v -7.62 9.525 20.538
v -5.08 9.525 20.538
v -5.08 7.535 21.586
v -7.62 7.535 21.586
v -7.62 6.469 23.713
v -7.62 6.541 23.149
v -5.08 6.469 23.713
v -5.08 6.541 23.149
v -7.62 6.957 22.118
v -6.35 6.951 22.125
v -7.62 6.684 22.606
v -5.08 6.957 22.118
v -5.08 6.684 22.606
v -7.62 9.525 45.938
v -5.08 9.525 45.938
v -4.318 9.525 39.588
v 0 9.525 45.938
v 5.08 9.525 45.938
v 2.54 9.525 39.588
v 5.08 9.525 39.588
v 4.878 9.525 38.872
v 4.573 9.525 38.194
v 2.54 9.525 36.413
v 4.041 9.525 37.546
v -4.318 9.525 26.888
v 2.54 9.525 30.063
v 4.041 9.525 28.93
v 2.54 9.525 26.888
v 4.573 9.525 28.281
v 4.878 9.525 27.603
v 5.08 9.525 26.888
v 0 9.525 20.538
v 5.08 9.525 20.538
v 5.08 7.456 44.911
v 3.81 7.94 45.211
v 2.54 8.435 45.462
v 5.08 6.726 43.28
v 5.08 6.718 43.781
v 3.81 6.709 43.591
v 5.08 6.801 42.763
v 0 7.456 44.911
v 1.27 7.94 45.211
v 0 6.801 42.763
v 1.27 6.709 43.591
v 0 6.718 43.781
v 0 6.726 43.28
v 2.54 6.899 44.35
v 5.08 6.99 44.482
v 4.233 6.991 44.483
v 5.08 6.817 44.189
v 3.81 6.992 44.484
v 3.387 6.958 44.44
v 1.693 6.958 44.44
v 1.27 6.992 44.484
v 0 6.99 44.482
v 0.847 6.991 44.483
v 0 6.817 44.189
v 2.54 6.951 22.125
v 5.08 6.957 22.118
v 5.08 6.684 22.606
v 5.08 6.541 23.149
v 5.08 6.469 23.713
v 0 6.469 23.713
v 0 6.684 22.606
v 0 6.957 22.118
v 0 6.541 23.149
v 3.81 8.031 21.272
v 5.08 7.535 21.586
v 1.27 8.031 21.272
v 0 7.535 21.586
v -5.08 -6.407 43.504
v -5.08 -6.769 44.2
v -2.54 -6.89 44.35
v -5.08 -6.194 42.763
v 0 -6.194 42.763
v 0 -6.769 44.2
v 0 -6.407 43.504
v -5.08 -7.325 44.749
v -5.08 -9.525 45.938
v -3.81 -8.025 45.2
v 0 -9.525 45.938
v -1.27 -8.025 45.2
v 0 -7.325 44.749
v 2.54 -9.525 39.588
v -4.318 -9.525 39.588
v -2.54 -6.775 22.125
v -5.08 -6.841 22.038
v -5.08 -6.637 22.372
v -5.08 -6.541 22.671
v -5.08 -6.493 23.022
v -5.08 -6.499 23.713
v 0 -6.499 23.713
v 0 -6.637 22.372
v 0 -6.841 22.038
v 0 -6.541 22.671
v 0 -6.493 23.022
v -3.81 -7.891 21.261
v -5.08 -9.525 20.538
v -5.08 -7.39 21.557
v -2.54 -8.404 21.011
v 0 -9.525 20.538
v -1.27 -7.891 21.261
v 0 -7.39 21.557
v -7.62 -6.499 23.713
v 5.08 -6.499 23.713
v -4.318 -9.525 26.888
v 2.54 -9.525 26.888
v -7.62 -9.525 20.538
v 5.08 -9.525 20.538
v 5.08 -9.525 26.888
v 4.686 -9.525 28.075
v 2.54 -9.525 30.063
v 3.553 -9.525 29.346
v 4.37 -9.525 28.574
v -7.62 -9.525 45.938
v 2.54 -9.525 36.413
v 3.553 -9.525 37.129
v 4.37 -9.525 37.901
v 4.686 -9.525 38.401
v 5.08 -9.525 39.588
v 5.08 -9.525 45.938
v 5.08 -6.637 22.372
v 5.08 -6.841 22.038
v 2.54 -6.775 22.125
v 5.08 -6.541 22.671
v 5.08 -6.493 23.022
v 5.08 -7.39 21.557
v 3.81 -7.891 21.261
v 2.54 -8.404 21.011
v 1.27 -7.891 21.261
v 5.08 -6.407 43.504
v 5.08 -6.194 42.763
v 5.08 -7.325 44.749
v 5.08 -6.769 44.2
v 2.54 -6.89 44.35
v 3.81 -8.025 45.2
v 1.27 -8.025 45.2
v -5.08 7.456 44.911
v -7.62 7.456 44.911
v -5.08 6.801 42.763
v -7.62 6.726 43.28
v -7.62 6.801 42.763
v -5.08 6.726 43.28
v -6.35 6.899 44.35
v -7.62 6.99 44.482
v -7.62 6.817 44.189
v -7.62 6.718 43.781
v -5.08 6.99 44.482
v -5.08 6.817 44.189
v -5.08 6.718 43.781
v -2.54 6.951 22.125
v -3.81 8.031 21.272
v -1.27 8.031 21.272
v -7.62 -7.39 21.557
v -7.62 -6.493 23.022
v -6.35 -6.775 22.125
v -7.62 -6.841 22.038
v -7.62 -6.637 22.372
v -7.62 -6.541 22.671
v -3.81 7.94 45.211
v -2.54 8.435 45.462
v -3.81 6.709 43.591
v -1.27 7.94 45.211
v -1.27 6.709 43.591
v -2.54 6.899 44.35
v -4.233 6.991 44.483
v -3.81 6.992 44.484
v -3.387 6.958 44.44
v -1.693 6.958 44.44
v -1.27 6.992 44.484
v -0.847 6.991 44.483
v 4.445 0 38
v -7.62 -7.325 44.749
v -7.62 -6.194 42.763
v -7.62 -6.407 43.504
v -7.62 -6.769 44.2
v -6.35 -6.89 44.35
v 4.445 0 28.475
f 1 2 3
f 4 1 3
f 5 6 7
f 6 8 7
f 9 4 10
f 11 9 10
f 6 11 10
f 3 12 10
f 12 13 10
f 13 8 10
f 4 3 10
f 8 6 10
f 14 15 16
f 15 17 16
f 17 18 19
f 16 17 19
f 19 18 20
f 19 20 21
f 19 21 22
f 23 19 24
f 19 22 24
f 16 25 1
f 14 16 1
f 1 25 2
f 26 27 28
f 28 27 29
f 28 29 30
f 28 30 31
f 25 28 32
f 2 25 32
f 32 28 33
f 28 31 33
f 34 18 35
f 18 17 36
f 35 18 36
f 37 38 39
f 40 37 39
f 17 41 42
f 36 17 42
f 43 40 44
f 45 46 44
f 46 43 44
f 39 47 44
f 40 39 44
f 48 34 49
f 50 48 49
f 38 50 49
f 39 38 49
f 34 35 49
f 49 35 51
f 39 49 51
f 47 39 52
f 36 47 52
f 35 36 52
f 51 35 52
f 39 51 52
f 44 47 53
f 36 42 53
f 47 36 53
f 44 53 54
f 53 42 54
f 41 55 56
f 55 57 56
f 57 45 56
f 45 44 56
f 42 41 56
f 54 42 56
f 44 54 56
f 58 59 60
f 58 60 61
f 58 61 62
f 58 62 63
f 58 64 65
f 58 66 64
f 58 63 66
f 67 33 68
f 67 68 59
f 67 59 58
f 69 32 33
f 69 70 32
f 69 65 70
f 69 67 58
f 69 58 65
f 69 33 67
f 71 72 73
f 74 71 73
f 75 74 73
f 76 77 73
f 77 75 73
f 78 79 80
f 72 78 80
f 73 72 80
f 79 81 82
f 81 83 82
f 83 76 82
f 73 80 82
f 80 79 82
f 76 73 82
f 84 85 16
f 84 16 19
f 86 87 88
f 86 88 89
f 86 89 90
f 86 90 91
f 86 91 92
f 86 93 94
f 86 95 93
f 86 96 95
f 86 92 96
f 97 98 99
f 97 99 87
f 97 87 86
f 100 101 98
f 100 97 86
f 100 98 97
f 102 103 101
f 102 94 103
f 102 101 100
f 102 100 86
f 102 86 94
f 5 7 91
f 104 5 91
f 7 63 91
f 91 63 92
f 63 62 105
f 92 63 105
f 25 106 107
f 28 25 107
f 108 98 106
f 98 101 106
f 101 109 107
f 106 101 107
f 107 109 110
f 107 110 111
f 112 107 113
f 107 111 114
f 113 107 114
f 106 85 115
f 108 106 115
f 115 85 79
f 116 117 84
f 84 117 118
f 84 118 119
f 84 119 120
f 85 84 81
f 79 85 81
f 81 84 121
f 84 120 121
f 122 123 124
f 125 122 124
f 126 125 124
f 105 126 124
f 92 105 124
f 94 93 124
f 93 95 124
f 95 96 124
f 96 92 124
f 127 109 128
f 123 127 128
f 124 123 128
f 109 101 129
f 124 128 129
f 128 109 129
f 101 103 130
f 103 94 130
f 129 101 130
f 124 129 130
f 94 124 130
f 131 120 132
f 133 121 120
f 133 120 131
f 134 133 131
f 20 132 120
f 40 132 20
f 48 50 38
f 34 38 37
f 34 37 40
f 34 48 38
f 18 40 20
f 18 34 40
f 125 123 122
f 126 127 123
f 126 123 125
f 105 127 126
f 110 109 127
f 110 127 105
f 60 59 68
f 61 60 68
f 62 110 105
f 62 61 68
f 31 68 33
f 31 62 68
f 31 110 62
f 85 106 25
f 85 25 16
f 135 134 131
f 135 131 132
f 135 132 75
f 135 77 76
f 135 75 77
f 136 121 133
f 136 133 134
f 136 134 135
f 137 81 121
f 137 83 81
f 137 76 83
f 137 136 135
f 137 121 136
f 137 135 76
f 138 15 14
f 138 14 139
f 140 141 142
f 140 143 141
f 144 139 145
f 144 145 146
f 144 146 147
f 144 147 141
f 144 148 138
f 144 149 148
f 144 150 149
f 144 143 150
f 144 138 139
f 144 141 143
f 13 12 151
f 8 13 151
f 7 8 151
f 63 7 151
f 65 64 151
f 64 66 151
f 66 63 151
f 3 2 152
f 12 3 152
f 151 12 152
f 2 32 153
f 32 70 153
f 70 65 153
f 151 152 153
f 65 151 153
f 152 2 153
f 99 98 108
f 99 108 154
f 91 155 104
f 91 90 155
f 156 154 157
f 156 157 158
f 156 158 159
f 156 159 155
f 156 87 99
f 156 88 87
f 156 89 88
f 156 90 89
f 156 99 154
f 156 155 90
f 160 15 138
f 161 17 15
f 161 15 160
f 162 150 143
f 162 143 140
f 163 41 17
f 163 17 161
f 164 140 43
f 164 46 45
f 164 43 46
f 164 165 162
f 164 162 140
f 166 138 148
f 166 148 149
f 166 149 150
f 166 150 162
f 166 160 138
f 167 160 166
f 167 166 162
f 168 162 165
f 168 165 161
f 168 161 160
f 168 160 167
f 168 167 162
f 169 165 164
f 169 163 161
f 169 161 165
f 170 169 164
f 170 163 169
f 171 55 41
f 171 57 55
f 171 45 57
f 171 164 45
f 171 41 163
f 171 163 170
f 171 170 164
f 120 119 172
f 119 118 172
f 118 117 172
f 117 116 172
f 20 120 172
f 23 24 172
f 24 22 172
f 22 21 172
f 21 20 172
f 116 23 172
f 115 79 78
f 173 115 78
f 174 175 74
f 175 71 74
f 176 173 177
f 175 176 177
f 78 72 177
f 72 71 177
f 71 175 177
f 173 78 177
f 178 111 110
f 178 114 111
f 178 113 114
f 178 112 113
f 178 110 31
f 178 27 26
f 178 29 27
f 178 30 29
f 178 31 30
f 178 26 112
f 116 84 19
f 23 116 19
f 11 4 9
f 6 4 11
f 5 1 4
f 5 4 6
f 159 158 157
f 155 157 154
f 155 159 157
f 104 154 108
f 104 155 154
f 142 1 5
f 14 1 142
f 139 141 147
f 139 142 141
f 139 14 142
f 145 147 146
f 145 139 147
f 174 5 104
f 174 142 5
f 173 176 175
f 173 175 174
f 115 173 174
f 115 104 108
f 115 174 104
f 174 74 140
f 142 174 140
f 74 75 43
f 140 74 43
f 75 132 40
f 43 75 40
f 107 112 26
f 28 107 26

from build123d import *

# Parameters (mm, degrees)
F1_DEPTH  = 5.08
F2_W      = 9.398
F2_H      = 12.7
F3_DEPTH  = 36.4129
F5_W      = 19.05
F5_H      = 3.175
F4_W      = 19.05
F4_H      = 3.175
F6_DEPTH  = 2.54
F8_DEPTH  = 25.4
F10_DEPTH = 2.54


with BuildPart() as f1:
    # F0 (on Right) → F1 (new body, symmetric)
    with BuildSketch(Plane.YZ):
        Polygon((-9.525, 42.7627552986), (-9.525, 23.7127552986), (-6.4988480881, 23.7127552986), (6.468560081, 23.7127552986), (9.525, 23.7127552986), (9.525, 42.7627552986), (6.8012457341, 42.7627552986), (-6.1935493723, 42.7627552986), align=None)
        with BuildLine():
            Line((-9.525, 45.9377552986), (-9.525, 42.7627552986))
            Line((-9.525, 42.7627552986), (-6.1935493723, 42.7627552986))
            add(Edge.make_bspline(
                [(-9.525, 45.9377552986), (-8.4843289073, 45.4587623907), (-6.6623733691, 44.6201652706), (-6.3342528413, 43.3202012234), (-6.1935493723, 42.7627552986)],
                knots=[0, 0, 0, 0, 0.5711835832, 1, 1, 1, 1], degree=3))
        make_face()
        with BuildLine():
            add(Edge.make_bspline(
                [(9.525, 45.9377552986), (8.4082384885, 45.4684357534), (6.487493932, 44.6612419592), (6.708667258, 43.3229401352), (6.8012457341, 42.7627552986)],
                knots=[0, 0, 0, 0, 0.5814211514, 1, 1, 1, 1], degree=3))
            Line((6.8012457341, 42.7627552986), (9.525, 42.7627552986))
            Line((9.525, 42.7627552986), (9.525, 45.9377552986))
        make_face()
        with BuildLine():
            Line((-6.4988480881, 23.7127552986), (-9.525, 23.7127552986))
            Line((-9.525, 23.7127552986), (-9.525, 20.5377552986))
            add(Edge.make_bspline(
                [(-9.525, 20.5377552986), (-8.3782583984, 21.004520321), (-6.4146620617, 21.8037745617), (-6.4741154988, 23.1519254498), (-6.4988480881, 23.7127552986)],
                knots=[0, 0, 0, 0, 0.5840006829, 1, 1, 1, 1], degree=3))
        make_face()
        with BuildLine():
            Line((9.525, 23.7127552986), (6.468560081, 23.7127552986))
            add(Edge.make_bspline(
                [(9.525, 20.5377552986), (8.483129389, 21.0137326336), (6.6694729366, 21.8422994016), (6.528535002, 23.1544015571), (6.468560081, 23.7127552986)],
                knots=[0, 0, 0, 0, 0.5744586355, 1, 1, 1, 1], degree=3))
            Line((9.525, 20.5377552986), (9.525, 23.7127552986))
        make_face()
    extrude(amount=F1_DEPTH, both=True)

    # F2 (on face) → F3 (cut)
    with BuildSketch(Plane.XZ.offset(9.525)):
        with Locations((0.381, 33.2377552986)):
            Rectangle(F2_W, F2_H)
    extrude(amount=-F3_DEPTH, mode=Mode.SUBTRACT)

    # F5 (on face) + F4 (on face) → F6 (join)
    with BuildSketch(Plane.YZ.offset(5.08)):
        with Locations((0, 28.4752552986)):
            Rectangle(F5_W, F5_H)
    with BuildSketch(Plane.YZ.offset(5.08)):
        with Locations((0, 38.0002552986)):
            Rectangle(F4_W, F4_H)
    extrude(amount=-F6_DEPTH)

    # F7 (on face) → F8 (cut)
    with BuildSketch(Plane.XZ.offset(9.525)):
        with BuildLine():
            Line((5.08, 36.4127552986), (5.08, 39.5877552986))
            add(Edge.make_bspline(
                [(5.08, 39.5877552986), (4.9399237186, 39.0382267482), (4.6311542423, 37.8269035964), (3.2788294654, 36.9123905765), (2.54, 36.4127552986)],
                knots=[0, 0, 0, 0, 0.4536597435, 1, 1, 1, 1], degree=3))
            Line((2.54, 36.4127552986), (5.08, 36.4127552986))
        make_face()
        with BuildLine():
            add(Edge.make_bspline(
                [(5.08, 26.8877552986), (4.9399237186, 27.437283849), (4.6311542423, 28.6486070008), (3.2788294654, 29.5631200208), (2.54, 30.0627552986)],
                knots=[0, 0, 0, 0, 0.4536597435, 1, 1, 1, 1], degree=3))
            Line((5.08, 26.8877552986), (5.08, 30.0627552986))
            Line((5.08, 30.0627552986), (2.54, 30.0627552986))
        make_face()
    extrude(amount=-F8_DEPTH, mode=Mode.SUBTRACT)

    # F9 (on face) → F10 (join)
    with BuildSketch(Plane(origin=(-5.08, 0, 0), x_dir=(0, -1, 0), z_dir=(-1, 0, 0))):
        with BuildLine():
            add(Edge.make_bspline(
                [(-9.525, 20.5377552986), (-8.483129389, 21.0137326336), (-6.6694729366, 21.8422994016), (-6.528535002, 23.1544015571), (-6.468560081, 23.7127552986)],
                knots=[0, 0, 0, 0, 0.5744586355, 1, 1, 1, 1], degree=3))
            Line((-6.468560081, 23.7127552986), (6.4988480881, 23.7127552986))
            add(Edge.make_bspline(
                [(9.525, 20.5377552986), (8.3782583984, 21.004520321), (6.4146620617, 21.8037745617), (6.4741154988, 23.1519254498), (6.4988480881, 23.7127552986)],
                knots=[0, 0, 0, 0, 0.5840006829, 1, 1, 1, 1], degree=3))
            Line((9.525, 20.5377552986), (9.525, 45.9377552986))
            add(Edge.make_bspline(
                [(9.525, 45.9377552986), (8.4843289073, 45.4587623907), (6.6623733691, 44.6201652706), (6.3342528413, 43.3202012234), (6.1935493723, 42.7627552986)],
                knots=[0, 0, 0, 0, 0.5711835832, 1, 1, 1, 1], degree=3))
            Line((6.1935493723, 42.7627552986), (-6.8012457341, 42.7627552986))
            add(Edge.make_bspline(
                [(-9.525, 45.9377552986), (-8.4082384885, 45.4684357534), (-6.487493932, 44.6612419592), (-6.708667258, 43.3229401352), (-6.8012457341, 42.7627552986)],
                knots=[0, 0, 0, 0, 0.5814211514, 1, 1, 1, 1], degree=3))
            Line((-9.525, 45.9377552986), (-9.525, 20.5377552986))
        make_face()
    extrude(amount=F10_DEPTH)


solid = f1.part
